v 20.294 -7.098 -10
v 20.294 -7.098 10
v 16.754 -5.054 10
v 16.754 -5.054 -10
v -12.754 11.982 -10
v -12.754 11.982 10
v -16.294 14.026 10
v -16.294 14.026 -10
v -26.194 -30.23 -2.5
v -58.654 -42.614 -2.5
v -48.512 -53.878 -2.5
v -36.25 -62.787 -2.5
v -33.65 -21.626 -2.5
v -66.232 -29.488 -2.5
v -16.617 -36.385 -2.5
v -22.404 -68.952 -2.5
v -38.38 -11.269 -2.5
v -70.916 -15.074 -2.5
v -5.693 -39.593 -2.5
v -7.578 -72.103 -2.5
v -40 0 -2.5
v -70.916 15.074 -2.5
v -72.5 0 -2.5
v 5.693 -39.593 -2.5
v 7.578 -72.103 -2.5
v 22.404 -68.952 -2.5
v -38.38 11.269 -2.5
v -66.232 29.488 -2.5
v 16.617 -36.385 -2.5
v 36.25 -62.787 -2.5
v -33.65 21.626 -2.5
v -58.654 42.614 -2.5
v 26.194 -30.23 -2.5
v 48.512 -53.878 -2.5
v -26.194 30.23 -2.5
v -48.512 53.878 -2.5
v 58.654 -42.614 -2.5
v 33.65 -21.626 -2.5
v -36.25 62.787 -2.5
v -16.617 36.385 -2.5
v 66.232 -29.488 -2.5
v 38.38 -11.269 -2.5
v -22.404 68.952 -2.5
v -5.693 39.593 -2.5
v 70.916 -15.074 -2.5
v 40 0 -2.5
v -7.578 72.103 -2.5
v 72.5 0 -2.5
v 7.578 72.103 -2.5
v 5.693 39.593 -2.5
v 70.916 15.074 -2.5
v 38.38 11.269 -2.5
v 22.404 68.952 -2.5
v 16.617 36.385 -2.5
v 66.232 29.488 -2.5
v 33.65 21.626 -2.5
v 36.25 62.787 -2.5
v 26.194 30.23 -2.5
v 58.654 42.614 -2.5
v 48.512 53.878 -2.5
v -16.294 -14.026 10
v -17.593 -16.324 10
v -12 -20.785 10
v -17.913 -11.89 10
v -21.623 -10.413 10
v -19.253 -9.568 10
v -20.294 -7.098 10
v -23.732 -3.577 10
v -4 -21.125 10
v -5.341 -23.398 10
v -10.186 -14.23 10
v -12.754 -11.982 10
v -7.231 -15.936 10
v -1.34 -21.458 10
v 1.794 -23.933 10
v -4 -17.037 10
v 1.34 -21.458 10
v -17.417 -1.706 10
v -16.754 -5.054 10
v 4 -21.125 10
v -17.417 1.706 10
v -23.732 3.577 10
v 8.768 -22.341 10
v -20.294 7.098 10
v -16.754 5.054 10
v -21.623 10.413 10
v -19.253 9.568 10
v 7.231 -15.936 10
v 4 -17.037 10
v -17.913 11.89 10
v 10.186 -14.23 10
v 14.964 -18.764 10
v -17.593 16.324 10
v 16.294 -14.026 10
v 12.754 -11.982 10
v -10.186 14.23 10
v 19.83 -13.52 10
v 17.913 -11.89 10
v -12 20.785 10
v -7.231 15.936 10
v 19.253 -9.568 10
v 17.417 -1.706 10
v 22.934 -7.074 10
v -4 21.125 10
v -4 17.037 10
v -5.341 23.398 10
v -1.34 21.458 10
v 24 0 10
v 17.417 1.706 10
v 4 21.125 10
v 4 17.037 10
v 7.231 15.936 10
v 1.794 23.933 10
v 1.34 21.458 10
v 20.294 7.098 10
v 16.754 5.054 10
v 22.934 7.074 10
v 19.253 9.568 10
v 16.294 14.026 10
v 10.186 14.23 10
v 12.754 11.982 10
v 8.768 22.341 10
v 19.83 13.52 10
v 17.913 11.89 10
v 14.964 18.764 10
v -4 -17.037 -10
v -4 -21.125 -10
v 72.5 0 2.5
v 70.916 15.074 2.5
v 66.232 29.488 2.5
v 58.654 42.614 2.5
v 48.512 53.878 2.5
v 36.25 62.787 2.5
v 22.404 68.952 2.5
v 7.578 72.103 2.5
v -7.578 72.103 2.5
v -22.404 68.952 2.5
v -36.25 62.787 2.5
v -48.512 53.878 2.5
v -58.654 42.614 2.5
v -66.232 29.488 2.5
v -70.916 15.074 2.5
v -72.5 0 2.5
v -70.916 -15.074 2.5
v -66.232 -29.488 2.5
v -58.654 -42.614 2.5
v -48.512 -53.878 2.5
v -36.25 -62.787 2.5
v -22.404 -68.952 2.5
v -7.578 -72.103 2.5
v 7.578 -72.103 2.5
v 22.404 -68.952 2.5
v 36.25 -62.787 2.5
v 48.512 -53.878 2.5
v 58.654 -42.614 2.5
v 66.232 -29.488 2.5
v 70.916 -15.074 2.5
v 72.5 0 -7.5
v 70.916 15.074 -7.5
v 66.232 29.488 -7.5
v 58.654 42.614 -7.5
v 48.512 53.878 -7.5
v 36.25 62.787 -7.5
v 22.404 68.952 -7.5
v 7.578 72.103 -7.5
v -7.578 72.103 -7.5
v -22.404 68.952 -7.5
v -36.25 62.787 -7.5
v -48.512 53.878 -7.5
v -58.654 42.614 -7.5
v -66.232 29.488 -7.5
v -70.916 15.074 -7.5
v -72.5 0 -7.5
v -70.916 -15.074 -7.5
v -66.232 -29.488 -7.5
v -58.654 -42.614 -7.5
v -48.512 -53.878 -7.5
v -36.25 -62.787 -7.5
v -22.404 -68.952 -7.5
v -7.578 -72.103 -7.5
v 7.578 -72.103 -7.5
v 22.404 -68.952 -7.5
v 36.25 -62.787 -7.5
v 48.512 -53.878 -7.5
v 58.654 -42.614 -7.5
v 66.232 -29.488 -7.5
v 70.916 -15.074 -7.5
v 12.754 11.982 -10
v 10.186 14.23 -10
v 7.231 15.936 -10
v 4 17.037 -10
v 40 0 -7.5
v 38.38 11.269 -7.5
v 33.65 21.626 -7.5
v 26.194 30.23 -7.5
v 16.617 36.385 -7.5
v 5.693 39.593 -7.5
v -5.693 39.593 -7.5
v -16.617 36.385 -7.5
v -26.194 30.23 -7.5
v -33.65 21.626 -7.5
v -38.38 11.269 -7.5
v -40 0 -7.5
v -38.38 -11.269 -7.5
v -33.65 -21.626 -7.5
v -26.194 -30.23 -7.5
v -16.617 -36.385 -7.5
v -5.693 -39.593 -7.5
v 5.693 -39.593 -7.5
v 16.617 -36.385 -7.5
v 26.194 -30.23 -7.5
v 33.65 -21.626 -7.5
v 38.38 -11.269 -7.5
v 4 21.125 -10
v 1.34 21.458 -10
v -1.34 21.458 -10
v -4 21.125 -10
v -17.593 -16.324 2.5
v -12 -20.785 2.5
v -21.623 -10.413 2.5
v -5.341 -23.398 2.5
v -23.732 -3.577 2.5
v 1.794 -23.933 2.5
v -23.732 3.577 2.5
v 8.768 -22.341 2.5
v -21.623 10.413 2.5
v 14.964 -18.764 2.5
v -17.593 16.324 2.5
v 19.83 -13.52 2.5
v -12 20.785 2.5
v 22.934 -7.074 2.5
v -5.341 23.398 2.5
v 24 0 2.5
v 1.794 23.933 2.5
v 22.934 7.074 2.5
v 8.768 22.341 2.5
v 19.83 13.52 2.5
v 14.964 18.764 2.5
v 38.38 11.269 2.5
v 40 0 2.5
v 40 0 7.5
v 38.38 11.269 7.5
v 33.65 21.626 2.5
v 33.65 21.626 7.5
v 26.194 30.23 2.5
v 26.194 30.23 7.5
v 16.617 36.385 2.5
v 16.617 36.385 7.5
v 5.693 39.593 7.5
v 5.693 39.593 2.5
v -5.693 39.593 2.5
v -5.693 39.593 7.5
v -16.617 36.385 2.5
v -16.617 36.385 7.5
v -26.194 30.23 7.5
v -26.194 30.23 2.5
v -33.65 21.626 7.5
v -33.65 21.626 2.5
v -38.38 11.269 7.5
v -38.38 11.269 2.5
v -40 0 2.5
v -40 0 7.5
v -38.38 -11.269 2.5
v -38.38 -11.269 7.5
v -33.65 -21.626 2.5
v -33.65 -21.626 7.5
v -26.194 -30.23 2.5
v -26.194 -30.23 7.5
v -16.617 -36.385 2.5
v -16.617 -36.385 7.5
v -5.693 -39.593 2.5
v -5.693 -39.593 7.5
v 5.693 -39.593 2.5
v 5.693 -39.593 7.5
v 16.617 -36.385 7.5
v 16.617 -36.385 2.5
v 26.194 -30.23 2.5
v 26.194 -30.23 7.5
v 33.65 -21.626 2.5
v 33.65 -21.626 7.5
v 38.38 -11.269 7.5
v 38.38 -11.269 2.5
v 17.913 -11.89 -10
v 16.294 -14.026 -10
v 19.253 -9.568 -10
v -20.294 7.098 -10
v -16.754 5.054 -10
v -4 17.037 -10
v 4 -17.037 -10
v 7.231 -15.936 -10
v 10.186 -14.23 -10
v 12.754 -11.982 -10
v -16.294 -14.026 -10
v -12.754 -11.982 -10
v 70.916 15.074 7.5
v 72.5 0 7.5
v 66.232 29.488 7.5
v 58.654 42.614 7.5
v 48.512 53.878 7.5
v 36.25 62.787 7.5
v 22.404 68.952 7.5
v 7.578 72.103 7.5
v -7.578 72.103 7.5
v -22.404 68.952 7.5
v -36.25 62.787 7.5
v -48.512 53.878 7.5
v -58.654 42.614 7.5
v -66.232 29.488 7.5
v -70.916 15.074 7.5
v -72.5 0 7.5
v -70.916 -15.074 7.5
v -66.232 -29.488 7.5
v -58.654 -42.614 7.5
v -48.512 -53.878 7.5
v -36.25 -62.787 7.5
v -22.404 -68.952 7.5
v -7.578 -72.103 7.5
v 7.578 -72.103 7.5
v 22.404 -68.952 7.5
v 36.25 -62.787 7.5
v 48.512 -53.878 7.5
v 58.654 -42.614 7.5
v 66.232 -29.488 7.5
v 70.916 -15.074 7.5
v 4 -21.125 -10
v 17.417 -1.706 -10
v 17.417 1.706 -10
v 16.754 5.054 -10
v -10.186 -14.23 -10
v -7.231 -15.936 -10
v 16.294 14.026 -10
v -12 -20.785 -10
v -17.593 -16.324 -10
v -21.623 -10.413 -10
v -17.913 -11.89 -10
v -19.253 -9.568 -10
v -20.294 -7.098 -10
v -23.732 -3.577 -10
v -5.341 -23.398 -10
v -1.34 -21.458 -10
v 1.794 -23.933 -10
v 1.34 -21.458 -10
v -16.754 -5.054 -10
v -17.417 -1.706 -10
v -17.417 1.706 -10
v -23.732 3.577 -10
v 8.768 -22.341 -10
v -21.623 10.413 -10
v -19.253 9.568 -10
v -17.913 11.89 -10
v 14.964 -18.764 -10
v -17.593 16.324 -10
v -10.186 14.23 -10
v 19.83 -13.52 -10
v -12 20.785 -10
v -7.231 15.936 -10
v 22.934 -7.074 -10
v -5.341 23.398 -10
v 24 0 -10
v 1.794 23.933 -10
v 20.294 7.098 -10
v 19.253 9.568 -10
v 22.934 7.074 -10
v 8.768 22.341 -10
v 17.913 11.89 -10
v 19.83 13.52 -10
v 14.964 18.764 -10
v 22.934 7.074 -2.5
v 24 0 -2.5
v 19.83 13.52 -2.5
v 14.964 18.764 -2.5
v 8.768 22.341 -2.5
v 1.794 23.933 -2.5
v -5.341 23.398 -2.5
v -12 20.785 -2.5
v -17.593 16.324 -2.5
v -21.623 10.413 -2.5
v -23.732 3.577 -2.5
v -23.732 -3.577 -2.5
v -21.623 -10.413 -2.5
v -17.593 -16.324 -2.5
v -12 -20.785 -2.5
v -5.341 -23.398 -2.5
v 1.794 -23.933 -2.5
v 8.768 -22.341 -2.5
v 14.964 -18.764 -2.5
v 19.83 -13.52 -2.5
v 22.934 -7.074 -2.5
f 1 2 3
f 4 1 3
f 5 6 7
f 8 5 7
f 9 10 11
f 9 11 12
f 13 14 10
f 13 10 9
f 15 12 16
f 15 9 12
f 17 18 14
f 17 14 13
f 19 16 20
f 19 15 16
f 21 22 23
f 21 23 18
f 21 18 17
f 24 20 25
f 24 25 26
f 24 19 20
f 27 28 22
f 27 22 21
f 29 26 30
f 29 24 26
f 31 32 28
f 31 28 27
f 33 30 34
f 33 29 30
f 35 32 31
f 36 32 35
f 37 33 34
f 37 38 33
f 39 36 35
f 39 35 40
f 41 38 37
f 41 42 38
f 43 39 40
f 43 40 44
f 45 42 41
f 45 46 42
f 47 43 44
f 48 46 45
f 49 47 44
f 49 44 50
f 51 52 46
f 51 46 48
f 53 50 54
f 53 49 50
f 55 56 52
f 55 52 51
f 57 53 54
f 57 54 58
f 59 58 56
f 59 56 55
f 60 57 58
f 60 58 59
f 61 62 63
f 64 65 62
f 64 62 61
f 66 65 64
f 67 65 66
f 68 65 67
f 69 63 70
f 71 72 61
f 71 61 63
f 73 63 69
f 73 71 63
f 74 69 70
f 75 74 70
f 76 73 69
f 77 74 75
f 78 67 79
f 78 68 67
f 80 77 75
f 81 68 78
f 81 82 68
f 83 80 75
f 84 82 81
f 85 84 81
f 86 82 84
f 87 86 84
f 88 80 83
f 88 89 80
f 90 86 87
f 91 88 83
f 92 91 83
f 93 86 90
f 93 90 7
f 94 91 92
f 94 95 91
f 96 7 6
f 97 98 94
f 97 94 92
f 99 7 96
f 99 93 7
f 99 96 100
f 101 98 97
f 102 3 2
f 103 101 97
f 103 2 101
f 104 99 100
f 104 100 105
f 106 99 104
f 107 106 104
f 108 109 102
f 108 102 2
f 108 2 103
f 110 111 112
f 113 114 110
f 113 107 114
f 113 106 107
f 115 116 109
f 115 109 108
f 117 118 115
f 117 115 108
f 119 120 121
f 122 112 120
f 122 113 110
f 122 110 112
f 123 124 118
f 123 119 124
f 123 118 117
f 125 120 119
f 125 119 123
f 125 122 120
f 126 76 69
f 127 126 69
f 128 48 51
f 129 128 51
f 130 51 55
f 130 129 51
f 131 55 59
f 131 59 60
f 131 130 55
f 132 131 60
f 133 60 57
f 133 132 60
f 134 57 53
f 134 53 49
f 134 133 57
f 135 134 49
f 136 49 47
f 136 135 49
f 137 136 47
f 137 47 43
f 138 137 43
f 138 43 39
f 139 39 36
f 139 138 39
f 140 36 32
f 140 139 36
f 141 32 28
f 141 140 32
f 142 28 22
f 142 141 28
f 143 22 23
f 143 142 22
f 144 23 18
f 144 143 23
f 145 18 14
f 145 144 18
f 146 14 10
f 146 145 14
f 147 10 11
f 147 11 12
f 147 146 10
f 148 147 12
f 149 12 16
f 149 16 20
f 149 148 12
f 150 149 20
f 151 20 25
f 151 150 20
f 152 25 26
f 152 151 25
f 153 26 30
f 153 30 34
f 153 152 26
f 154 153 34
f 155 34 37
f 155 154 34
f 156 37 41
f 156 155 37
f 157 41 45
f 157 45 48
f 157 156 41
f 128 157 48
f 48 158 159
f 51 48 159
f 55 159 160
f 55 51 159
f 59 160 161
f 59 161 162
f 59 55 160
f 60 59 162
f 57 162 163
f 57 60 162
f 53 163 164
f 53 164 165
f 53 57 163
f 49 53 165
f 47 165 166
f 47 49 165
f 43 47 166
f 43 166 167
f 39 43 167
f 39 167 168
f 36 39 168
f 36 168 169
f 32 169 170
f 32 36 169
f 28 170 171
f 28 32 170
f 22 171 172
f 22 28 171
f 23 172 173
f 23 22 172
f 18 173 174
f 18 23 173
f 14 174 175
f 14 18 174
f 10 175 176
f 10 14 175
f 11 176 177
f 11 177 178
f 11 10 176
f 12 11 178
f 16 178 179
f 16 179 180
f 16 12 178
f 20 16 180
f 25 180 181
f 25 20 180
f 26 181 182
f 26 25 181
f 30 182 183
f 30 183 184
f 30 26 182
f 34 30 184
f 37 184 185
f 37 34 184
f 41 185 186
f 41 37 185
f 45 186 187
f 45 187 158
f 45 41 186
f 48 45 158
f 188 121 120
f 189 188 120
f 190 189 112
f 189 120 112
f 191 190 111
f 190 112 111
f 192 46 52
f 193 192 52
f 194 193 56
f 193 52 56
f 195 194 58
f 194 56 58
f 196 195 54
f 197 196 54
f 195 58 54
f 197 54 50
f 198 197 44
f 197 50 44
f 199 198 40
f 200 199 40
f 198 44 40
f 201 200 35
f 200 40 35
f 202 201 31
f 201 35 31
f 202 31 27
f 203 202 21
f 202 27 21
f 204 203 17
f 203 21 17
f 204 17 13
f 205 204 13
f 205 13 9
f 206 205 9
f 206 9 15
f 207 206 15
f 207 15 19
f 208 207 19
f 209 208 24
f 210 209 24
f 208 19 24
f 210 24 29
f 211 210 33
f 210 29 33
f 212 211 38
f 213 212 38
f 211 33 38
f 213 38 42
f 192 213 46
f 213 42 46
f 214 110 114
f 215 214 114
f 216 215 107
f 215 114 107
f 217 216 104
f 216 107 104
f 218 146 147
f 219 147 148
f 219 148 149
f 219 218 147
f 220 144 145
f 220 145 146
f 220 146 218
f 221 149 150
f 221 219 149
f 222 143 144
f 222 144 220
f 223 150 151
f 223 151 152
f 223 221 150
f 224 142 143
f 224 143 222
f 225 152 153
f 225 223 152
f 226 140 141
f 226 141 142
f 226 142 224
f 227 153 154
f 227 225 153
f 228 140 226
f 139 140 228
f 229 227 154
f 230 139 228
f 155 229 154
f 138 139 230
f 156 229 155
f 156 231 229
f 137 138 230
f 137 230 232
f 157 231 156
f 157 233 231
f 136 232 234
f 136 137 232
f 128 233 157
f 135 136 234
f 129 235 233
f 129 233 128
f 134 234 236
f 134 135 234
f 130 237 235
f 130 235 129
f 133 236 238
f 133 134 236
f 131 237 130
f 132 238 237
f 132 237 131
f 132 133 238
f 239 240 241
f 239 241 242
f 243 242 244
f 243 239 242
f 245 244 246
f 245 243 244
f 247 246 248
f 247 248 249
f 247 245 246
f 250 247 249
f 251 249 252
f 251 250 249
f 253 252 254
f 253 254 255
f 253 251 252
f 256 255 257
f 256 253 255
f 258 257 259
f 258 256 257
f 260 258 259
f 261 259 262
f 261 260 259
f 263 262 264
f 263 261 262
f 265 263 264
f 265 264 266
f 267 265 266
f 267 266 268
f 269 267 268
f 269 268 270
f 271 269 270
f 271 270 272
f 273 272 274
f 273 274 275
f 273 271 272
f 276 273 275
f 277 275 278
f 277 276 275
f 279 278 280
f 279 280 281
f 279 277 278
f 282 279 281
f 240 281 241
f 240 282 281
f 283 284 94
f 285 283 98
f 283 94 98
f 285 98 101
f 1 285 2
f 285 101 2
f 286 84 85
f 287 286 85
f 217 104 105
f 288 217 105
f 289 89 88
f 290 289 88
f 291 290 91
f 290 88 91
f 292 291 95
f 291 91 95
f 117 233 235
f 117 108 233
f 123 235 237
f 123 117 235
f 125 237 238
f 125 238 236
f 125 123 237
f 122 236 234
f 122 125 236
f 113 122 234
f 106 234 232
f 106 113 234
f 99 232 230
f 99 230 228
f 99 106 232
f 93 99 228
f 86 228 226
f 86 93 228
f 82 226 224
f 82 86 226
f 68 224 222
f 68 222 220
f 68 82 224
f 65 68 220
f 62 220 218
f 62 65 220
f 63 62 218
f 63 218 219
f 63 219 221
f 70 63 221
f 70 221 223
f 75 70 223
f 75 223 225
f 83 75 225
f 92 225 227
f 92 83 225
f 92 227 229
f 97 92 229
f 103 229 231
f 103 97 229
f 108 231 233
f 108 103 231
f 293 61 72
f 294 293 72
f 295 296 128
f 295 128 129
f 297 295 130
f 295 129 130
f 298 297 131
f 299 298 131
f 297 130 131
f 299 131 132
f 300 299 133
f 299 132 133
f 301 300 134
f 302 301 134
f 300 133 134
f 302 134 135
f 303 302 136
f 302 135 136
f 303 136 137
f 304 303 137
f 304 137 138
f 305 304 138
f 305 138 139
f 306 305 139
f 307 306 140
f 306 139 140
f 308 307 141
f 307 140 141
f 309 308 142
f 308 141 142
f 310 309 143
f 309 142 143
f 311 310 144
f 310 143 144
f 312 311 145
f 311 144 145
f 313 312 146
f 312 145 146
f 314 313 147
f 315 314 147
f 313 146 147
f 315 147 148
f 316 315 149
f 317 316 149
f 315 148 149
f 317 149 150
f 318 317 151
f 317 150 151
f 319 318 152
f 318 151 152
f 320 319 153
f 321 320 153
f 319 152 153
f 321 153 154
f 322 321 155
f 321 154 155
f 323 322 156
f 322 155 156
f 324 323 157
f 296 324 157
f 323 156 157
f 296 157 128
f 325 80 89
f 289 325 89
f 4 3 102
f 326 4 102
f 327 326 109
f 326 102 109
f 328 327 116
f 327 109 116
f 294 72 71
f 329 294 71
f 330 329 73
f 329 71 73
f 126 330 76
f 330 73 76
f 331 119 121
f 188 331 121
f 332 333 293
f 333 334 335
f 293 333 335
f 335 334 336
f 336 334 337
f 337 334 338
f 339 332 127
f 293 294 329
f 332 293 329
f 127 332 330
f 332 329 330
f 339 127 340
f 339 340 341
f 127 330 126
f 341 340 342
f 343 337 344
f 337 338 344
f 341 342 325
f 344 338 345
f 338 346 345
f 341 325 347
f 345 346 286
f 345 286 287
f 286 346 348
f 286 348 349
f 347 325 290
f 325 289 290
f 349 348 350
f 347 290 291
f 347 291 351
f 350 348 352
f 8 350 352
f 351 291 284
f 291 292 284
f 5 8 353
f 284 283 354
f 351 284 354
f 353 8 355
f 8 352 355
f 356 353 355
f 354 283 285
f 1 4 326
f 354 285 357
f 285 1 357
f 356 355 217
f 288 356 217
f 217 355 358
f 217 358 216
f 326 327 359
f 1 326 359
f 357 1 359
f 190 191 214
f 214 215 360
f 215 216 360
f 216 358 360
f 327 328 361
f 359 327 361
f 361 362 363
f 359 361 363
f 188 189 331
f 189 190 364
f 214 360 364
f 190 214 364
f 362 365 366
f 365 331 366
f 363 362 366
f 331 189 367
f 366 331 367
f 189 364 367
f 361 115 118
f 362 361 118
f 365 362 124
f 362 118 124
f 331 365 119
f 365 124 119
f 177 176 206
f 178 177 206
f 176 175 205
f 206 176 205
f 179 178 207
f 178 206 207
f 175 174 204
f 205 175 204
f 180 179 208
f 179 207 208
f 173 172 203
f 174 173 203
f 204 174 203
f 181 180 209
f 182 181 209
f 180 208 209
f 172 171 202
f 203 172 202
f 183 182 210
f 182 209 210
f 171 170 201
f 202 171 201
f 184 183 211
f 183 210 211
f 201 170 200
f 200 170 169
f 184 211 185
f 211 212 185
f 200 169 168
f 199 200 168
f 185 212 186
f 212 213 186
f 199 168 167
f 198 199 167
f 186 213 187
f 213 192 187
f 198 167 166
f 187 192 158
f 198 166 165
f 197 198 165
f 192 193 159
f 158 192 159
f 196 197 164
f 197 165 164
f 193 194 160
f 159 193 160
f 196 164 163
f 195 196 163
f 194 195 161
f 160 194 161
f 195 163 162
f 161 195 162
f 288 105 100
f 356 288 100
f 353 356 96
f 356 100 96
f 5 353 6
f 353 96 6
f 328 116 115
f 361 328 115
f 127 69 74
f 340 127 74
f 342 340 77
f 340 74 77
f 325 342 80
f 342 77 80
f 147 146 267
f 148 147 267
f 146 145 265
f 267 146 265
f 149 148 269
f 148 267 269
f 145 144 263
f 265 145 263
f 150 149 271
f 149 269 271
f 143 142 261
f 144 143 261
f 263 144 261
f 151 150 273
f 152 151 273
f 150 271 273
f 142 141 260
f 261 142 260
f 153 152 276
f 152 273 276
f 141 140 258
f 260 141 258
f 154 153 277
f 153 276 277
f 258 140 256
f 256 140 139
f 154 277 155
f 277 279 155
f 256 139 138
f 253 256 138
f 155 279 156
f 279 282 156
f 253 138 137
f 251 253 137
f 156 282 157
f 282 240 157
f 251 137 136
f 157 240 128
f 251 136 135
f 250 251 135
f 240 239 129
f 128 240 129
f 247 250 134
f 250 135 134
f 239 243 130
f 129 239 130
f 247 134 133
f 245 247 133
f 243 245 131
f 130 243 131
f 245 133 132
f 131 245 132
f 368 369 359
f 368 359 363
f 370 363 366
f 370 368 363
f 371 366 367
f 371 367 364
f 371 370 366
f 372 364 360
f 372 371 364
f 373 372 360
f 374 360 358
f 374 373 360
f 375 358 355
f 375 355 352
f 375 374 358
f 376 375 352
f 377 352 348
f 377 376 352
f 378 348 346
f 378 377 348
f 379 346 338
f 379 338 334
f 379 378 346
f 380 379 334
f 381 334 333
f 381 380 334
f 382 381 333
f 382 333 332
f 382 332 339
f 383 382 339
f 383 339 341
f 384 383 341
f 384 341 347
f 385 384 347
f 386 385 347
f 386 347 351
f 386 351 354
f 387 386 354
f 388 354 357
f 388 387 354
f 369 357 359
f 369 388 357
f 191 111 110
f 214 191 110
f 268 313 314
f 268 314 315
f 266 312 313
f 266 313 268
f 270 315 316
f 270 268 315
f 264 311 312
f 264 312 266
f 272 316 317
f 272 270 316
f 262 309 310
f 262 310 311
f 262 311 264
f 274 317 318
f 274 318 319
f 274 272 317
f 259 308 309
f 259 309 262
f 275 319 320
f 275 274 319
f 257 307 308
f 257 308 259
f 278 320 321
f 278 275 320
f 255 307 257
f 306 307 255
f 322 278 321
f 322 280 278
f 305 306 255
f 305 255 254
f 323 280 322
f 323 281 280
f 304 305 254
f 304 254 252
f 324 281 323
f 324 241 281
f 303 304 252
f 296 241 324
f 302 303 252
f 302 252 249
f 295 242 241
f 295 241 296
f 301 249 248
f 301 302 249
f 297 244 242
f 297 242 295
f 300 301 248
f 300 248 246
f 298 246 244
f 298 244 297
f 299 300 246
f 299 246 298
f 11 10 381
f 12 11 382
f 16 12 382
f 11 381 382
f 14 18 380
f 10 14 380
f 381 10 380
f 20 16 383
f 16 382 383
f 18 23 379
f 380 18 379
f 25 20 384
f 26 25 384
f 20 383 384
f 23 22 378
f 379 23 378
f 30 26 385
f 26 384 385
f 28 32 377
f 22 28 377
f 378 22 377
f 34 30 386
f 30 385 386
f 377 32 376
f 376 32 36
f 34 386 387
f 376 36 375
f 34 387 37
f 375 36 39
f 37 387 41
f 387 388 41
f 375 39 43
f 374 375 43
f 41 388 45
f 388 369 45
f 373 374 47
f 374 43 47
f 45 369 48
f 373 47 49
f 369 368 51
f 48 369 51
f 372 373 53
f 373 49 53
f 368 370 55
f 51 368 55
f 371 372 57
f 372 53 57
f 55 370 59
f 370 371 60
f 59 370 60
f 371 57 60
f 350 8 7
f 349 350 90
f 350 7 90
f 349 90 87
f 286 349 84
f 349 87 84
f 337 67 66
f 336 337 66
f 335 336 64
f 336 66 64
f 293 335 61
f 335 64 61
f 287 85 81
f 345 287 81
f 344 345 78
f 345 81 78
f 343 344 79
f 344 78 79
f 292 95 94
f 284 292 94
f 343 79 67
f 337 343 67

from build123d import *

# Parameters (mm, degrees)
SKETCH1_R           = 72.5
BOSS_EXTRUDE1_DEPTH = 2.5
SKETCH3_R           = 24
BOSS_EXTRUDE2_DEPTH = 10
SKETCH4_R           = 72.5
SKETCH4_R_2         = 40
BOSS_EXTRUDE3_DEPTH = 5
CUT_EXTRUDE1_DEPTH  = 105.462912079


with BuildPart() as part:
    # Sketch1 → Boss-Extrude1 (new, symmetric)
    with BuildSketch(Plane.XY):
        Circle(SKETCH1_R)
    extrude(amount=BOSS_EXTRUDE1_DEPTH, both=True)

    # Sketch3 → Boss-Extrude2 (add, symmetric)
    with BuildSketch(Plane.XY):
        Circle(SKETCH3_R)
    extrude(amount=BOSS_EXTRUDE2_DEPTH, both=True)

    # Sketch5 → Cut-Extrude1 (cut, through all)
    with BuildSketch(Plane.XY.offset(10)):
        with BuildLine():
            ThreePointArc((4, 21.124630174), (0, 21.5), (-4, 21.124630174))
            Line((-4, 21.124630174), (-4, 17.036725037))
            ThreePointArc((-4, 17.036725037), (-8.75, 15.155444566), (-12.75423668, 11.982464134))
            Line((-12.75423668, 11.982464134), (-16.294466376, 14.026416702))
            ThreePointArc((-16.294466376, 14.026416702), (-18.619546181, 10.75), (-20.294466376, 7.098213472))
            Line((-20.294466376, 7.098213472), (-16.75423668, 5.054260904))
            ThreePointArc((-16.75423668, 5.054260904), (-17.5, 0), (-16.75423668, -5.054260904))
            Line((-16.75423668, -5.054260904), (-20.294466376, -7.098213472))
            ThreePointArc((-20.294466376, -7.098213472), (-18.619546181, -10.75), (-16.294466376, -14.026416702))
            Line((-16.294466376, -14.026416702), (-12.75423668, -11.982464134))
            ThreePointArc((-12.75423668, -11.982464134), (-8.75, -15.155444566), (-4, -17.036725037))
            Line((-4, -17.036725037), (-4, -21.124630174))
            ThreePointArc((-4, -21.124630174), (0, -21.5), (4, -21.124630174))
            Line((4, -21.124630174), (4, -17.036725037))
            ThreePointArc((4, -17.036725037), (8.75, -15.155444566), (12.75423668, -11.982464134))
            Line((12.75423668, -11.982464134), (16.294466376, -14.026416702))
            ThreePointArc((16.294466376, -14.026416702), (18.619546181, -10.75), (20.294466376, -7.098213472))
            Line((20.294466376, -7.098213472), (16.75423668, -5.054260904))
            ThreePointArc((16.75423668, -5.054260904), (17.5, 0), (16.75423668, 5.054260904))
            Line((16.75423668, 5.054260904), (20.294466376, 7.098213472))
            ThreePointArc((20.294466376, 7.098213472), (18.619546181, 10.75), (16.294466376, 14.026416702))
            Line((16.294466376, 14.026416702), (12.75423668, 11.982464134))
            ThreePointArc((12.75423668, 11.982464134), (8.75, 15.155444566), (4, 17.036725037))
            Line((4, 17.036725037), (4, 21.124630174))
        make_face()
    extrude(amount=-CUT_EXTRUDE1_DEPTH, mode=Mode.SUBTRACT)


with BuildPart() as body_2:
    # Sketch4 → Boss-Extrude3 (new body)
    with BuildSketch(Plane.XY.offset(2.5)):
        Circle(SKETCH4_R)
        Circle(SKETCH4_R_2, mode=Mode.SUBTRACT)
    extrude(amount=BOSS_EXTRUDE3_DEPTH)


with BuildPart() as body_3:
    # Mirror3: mirrored copy
    add(body_2.part.mirror(Plane.XY))


solid = Compound([part.part, body_2.part, body_3.part])
